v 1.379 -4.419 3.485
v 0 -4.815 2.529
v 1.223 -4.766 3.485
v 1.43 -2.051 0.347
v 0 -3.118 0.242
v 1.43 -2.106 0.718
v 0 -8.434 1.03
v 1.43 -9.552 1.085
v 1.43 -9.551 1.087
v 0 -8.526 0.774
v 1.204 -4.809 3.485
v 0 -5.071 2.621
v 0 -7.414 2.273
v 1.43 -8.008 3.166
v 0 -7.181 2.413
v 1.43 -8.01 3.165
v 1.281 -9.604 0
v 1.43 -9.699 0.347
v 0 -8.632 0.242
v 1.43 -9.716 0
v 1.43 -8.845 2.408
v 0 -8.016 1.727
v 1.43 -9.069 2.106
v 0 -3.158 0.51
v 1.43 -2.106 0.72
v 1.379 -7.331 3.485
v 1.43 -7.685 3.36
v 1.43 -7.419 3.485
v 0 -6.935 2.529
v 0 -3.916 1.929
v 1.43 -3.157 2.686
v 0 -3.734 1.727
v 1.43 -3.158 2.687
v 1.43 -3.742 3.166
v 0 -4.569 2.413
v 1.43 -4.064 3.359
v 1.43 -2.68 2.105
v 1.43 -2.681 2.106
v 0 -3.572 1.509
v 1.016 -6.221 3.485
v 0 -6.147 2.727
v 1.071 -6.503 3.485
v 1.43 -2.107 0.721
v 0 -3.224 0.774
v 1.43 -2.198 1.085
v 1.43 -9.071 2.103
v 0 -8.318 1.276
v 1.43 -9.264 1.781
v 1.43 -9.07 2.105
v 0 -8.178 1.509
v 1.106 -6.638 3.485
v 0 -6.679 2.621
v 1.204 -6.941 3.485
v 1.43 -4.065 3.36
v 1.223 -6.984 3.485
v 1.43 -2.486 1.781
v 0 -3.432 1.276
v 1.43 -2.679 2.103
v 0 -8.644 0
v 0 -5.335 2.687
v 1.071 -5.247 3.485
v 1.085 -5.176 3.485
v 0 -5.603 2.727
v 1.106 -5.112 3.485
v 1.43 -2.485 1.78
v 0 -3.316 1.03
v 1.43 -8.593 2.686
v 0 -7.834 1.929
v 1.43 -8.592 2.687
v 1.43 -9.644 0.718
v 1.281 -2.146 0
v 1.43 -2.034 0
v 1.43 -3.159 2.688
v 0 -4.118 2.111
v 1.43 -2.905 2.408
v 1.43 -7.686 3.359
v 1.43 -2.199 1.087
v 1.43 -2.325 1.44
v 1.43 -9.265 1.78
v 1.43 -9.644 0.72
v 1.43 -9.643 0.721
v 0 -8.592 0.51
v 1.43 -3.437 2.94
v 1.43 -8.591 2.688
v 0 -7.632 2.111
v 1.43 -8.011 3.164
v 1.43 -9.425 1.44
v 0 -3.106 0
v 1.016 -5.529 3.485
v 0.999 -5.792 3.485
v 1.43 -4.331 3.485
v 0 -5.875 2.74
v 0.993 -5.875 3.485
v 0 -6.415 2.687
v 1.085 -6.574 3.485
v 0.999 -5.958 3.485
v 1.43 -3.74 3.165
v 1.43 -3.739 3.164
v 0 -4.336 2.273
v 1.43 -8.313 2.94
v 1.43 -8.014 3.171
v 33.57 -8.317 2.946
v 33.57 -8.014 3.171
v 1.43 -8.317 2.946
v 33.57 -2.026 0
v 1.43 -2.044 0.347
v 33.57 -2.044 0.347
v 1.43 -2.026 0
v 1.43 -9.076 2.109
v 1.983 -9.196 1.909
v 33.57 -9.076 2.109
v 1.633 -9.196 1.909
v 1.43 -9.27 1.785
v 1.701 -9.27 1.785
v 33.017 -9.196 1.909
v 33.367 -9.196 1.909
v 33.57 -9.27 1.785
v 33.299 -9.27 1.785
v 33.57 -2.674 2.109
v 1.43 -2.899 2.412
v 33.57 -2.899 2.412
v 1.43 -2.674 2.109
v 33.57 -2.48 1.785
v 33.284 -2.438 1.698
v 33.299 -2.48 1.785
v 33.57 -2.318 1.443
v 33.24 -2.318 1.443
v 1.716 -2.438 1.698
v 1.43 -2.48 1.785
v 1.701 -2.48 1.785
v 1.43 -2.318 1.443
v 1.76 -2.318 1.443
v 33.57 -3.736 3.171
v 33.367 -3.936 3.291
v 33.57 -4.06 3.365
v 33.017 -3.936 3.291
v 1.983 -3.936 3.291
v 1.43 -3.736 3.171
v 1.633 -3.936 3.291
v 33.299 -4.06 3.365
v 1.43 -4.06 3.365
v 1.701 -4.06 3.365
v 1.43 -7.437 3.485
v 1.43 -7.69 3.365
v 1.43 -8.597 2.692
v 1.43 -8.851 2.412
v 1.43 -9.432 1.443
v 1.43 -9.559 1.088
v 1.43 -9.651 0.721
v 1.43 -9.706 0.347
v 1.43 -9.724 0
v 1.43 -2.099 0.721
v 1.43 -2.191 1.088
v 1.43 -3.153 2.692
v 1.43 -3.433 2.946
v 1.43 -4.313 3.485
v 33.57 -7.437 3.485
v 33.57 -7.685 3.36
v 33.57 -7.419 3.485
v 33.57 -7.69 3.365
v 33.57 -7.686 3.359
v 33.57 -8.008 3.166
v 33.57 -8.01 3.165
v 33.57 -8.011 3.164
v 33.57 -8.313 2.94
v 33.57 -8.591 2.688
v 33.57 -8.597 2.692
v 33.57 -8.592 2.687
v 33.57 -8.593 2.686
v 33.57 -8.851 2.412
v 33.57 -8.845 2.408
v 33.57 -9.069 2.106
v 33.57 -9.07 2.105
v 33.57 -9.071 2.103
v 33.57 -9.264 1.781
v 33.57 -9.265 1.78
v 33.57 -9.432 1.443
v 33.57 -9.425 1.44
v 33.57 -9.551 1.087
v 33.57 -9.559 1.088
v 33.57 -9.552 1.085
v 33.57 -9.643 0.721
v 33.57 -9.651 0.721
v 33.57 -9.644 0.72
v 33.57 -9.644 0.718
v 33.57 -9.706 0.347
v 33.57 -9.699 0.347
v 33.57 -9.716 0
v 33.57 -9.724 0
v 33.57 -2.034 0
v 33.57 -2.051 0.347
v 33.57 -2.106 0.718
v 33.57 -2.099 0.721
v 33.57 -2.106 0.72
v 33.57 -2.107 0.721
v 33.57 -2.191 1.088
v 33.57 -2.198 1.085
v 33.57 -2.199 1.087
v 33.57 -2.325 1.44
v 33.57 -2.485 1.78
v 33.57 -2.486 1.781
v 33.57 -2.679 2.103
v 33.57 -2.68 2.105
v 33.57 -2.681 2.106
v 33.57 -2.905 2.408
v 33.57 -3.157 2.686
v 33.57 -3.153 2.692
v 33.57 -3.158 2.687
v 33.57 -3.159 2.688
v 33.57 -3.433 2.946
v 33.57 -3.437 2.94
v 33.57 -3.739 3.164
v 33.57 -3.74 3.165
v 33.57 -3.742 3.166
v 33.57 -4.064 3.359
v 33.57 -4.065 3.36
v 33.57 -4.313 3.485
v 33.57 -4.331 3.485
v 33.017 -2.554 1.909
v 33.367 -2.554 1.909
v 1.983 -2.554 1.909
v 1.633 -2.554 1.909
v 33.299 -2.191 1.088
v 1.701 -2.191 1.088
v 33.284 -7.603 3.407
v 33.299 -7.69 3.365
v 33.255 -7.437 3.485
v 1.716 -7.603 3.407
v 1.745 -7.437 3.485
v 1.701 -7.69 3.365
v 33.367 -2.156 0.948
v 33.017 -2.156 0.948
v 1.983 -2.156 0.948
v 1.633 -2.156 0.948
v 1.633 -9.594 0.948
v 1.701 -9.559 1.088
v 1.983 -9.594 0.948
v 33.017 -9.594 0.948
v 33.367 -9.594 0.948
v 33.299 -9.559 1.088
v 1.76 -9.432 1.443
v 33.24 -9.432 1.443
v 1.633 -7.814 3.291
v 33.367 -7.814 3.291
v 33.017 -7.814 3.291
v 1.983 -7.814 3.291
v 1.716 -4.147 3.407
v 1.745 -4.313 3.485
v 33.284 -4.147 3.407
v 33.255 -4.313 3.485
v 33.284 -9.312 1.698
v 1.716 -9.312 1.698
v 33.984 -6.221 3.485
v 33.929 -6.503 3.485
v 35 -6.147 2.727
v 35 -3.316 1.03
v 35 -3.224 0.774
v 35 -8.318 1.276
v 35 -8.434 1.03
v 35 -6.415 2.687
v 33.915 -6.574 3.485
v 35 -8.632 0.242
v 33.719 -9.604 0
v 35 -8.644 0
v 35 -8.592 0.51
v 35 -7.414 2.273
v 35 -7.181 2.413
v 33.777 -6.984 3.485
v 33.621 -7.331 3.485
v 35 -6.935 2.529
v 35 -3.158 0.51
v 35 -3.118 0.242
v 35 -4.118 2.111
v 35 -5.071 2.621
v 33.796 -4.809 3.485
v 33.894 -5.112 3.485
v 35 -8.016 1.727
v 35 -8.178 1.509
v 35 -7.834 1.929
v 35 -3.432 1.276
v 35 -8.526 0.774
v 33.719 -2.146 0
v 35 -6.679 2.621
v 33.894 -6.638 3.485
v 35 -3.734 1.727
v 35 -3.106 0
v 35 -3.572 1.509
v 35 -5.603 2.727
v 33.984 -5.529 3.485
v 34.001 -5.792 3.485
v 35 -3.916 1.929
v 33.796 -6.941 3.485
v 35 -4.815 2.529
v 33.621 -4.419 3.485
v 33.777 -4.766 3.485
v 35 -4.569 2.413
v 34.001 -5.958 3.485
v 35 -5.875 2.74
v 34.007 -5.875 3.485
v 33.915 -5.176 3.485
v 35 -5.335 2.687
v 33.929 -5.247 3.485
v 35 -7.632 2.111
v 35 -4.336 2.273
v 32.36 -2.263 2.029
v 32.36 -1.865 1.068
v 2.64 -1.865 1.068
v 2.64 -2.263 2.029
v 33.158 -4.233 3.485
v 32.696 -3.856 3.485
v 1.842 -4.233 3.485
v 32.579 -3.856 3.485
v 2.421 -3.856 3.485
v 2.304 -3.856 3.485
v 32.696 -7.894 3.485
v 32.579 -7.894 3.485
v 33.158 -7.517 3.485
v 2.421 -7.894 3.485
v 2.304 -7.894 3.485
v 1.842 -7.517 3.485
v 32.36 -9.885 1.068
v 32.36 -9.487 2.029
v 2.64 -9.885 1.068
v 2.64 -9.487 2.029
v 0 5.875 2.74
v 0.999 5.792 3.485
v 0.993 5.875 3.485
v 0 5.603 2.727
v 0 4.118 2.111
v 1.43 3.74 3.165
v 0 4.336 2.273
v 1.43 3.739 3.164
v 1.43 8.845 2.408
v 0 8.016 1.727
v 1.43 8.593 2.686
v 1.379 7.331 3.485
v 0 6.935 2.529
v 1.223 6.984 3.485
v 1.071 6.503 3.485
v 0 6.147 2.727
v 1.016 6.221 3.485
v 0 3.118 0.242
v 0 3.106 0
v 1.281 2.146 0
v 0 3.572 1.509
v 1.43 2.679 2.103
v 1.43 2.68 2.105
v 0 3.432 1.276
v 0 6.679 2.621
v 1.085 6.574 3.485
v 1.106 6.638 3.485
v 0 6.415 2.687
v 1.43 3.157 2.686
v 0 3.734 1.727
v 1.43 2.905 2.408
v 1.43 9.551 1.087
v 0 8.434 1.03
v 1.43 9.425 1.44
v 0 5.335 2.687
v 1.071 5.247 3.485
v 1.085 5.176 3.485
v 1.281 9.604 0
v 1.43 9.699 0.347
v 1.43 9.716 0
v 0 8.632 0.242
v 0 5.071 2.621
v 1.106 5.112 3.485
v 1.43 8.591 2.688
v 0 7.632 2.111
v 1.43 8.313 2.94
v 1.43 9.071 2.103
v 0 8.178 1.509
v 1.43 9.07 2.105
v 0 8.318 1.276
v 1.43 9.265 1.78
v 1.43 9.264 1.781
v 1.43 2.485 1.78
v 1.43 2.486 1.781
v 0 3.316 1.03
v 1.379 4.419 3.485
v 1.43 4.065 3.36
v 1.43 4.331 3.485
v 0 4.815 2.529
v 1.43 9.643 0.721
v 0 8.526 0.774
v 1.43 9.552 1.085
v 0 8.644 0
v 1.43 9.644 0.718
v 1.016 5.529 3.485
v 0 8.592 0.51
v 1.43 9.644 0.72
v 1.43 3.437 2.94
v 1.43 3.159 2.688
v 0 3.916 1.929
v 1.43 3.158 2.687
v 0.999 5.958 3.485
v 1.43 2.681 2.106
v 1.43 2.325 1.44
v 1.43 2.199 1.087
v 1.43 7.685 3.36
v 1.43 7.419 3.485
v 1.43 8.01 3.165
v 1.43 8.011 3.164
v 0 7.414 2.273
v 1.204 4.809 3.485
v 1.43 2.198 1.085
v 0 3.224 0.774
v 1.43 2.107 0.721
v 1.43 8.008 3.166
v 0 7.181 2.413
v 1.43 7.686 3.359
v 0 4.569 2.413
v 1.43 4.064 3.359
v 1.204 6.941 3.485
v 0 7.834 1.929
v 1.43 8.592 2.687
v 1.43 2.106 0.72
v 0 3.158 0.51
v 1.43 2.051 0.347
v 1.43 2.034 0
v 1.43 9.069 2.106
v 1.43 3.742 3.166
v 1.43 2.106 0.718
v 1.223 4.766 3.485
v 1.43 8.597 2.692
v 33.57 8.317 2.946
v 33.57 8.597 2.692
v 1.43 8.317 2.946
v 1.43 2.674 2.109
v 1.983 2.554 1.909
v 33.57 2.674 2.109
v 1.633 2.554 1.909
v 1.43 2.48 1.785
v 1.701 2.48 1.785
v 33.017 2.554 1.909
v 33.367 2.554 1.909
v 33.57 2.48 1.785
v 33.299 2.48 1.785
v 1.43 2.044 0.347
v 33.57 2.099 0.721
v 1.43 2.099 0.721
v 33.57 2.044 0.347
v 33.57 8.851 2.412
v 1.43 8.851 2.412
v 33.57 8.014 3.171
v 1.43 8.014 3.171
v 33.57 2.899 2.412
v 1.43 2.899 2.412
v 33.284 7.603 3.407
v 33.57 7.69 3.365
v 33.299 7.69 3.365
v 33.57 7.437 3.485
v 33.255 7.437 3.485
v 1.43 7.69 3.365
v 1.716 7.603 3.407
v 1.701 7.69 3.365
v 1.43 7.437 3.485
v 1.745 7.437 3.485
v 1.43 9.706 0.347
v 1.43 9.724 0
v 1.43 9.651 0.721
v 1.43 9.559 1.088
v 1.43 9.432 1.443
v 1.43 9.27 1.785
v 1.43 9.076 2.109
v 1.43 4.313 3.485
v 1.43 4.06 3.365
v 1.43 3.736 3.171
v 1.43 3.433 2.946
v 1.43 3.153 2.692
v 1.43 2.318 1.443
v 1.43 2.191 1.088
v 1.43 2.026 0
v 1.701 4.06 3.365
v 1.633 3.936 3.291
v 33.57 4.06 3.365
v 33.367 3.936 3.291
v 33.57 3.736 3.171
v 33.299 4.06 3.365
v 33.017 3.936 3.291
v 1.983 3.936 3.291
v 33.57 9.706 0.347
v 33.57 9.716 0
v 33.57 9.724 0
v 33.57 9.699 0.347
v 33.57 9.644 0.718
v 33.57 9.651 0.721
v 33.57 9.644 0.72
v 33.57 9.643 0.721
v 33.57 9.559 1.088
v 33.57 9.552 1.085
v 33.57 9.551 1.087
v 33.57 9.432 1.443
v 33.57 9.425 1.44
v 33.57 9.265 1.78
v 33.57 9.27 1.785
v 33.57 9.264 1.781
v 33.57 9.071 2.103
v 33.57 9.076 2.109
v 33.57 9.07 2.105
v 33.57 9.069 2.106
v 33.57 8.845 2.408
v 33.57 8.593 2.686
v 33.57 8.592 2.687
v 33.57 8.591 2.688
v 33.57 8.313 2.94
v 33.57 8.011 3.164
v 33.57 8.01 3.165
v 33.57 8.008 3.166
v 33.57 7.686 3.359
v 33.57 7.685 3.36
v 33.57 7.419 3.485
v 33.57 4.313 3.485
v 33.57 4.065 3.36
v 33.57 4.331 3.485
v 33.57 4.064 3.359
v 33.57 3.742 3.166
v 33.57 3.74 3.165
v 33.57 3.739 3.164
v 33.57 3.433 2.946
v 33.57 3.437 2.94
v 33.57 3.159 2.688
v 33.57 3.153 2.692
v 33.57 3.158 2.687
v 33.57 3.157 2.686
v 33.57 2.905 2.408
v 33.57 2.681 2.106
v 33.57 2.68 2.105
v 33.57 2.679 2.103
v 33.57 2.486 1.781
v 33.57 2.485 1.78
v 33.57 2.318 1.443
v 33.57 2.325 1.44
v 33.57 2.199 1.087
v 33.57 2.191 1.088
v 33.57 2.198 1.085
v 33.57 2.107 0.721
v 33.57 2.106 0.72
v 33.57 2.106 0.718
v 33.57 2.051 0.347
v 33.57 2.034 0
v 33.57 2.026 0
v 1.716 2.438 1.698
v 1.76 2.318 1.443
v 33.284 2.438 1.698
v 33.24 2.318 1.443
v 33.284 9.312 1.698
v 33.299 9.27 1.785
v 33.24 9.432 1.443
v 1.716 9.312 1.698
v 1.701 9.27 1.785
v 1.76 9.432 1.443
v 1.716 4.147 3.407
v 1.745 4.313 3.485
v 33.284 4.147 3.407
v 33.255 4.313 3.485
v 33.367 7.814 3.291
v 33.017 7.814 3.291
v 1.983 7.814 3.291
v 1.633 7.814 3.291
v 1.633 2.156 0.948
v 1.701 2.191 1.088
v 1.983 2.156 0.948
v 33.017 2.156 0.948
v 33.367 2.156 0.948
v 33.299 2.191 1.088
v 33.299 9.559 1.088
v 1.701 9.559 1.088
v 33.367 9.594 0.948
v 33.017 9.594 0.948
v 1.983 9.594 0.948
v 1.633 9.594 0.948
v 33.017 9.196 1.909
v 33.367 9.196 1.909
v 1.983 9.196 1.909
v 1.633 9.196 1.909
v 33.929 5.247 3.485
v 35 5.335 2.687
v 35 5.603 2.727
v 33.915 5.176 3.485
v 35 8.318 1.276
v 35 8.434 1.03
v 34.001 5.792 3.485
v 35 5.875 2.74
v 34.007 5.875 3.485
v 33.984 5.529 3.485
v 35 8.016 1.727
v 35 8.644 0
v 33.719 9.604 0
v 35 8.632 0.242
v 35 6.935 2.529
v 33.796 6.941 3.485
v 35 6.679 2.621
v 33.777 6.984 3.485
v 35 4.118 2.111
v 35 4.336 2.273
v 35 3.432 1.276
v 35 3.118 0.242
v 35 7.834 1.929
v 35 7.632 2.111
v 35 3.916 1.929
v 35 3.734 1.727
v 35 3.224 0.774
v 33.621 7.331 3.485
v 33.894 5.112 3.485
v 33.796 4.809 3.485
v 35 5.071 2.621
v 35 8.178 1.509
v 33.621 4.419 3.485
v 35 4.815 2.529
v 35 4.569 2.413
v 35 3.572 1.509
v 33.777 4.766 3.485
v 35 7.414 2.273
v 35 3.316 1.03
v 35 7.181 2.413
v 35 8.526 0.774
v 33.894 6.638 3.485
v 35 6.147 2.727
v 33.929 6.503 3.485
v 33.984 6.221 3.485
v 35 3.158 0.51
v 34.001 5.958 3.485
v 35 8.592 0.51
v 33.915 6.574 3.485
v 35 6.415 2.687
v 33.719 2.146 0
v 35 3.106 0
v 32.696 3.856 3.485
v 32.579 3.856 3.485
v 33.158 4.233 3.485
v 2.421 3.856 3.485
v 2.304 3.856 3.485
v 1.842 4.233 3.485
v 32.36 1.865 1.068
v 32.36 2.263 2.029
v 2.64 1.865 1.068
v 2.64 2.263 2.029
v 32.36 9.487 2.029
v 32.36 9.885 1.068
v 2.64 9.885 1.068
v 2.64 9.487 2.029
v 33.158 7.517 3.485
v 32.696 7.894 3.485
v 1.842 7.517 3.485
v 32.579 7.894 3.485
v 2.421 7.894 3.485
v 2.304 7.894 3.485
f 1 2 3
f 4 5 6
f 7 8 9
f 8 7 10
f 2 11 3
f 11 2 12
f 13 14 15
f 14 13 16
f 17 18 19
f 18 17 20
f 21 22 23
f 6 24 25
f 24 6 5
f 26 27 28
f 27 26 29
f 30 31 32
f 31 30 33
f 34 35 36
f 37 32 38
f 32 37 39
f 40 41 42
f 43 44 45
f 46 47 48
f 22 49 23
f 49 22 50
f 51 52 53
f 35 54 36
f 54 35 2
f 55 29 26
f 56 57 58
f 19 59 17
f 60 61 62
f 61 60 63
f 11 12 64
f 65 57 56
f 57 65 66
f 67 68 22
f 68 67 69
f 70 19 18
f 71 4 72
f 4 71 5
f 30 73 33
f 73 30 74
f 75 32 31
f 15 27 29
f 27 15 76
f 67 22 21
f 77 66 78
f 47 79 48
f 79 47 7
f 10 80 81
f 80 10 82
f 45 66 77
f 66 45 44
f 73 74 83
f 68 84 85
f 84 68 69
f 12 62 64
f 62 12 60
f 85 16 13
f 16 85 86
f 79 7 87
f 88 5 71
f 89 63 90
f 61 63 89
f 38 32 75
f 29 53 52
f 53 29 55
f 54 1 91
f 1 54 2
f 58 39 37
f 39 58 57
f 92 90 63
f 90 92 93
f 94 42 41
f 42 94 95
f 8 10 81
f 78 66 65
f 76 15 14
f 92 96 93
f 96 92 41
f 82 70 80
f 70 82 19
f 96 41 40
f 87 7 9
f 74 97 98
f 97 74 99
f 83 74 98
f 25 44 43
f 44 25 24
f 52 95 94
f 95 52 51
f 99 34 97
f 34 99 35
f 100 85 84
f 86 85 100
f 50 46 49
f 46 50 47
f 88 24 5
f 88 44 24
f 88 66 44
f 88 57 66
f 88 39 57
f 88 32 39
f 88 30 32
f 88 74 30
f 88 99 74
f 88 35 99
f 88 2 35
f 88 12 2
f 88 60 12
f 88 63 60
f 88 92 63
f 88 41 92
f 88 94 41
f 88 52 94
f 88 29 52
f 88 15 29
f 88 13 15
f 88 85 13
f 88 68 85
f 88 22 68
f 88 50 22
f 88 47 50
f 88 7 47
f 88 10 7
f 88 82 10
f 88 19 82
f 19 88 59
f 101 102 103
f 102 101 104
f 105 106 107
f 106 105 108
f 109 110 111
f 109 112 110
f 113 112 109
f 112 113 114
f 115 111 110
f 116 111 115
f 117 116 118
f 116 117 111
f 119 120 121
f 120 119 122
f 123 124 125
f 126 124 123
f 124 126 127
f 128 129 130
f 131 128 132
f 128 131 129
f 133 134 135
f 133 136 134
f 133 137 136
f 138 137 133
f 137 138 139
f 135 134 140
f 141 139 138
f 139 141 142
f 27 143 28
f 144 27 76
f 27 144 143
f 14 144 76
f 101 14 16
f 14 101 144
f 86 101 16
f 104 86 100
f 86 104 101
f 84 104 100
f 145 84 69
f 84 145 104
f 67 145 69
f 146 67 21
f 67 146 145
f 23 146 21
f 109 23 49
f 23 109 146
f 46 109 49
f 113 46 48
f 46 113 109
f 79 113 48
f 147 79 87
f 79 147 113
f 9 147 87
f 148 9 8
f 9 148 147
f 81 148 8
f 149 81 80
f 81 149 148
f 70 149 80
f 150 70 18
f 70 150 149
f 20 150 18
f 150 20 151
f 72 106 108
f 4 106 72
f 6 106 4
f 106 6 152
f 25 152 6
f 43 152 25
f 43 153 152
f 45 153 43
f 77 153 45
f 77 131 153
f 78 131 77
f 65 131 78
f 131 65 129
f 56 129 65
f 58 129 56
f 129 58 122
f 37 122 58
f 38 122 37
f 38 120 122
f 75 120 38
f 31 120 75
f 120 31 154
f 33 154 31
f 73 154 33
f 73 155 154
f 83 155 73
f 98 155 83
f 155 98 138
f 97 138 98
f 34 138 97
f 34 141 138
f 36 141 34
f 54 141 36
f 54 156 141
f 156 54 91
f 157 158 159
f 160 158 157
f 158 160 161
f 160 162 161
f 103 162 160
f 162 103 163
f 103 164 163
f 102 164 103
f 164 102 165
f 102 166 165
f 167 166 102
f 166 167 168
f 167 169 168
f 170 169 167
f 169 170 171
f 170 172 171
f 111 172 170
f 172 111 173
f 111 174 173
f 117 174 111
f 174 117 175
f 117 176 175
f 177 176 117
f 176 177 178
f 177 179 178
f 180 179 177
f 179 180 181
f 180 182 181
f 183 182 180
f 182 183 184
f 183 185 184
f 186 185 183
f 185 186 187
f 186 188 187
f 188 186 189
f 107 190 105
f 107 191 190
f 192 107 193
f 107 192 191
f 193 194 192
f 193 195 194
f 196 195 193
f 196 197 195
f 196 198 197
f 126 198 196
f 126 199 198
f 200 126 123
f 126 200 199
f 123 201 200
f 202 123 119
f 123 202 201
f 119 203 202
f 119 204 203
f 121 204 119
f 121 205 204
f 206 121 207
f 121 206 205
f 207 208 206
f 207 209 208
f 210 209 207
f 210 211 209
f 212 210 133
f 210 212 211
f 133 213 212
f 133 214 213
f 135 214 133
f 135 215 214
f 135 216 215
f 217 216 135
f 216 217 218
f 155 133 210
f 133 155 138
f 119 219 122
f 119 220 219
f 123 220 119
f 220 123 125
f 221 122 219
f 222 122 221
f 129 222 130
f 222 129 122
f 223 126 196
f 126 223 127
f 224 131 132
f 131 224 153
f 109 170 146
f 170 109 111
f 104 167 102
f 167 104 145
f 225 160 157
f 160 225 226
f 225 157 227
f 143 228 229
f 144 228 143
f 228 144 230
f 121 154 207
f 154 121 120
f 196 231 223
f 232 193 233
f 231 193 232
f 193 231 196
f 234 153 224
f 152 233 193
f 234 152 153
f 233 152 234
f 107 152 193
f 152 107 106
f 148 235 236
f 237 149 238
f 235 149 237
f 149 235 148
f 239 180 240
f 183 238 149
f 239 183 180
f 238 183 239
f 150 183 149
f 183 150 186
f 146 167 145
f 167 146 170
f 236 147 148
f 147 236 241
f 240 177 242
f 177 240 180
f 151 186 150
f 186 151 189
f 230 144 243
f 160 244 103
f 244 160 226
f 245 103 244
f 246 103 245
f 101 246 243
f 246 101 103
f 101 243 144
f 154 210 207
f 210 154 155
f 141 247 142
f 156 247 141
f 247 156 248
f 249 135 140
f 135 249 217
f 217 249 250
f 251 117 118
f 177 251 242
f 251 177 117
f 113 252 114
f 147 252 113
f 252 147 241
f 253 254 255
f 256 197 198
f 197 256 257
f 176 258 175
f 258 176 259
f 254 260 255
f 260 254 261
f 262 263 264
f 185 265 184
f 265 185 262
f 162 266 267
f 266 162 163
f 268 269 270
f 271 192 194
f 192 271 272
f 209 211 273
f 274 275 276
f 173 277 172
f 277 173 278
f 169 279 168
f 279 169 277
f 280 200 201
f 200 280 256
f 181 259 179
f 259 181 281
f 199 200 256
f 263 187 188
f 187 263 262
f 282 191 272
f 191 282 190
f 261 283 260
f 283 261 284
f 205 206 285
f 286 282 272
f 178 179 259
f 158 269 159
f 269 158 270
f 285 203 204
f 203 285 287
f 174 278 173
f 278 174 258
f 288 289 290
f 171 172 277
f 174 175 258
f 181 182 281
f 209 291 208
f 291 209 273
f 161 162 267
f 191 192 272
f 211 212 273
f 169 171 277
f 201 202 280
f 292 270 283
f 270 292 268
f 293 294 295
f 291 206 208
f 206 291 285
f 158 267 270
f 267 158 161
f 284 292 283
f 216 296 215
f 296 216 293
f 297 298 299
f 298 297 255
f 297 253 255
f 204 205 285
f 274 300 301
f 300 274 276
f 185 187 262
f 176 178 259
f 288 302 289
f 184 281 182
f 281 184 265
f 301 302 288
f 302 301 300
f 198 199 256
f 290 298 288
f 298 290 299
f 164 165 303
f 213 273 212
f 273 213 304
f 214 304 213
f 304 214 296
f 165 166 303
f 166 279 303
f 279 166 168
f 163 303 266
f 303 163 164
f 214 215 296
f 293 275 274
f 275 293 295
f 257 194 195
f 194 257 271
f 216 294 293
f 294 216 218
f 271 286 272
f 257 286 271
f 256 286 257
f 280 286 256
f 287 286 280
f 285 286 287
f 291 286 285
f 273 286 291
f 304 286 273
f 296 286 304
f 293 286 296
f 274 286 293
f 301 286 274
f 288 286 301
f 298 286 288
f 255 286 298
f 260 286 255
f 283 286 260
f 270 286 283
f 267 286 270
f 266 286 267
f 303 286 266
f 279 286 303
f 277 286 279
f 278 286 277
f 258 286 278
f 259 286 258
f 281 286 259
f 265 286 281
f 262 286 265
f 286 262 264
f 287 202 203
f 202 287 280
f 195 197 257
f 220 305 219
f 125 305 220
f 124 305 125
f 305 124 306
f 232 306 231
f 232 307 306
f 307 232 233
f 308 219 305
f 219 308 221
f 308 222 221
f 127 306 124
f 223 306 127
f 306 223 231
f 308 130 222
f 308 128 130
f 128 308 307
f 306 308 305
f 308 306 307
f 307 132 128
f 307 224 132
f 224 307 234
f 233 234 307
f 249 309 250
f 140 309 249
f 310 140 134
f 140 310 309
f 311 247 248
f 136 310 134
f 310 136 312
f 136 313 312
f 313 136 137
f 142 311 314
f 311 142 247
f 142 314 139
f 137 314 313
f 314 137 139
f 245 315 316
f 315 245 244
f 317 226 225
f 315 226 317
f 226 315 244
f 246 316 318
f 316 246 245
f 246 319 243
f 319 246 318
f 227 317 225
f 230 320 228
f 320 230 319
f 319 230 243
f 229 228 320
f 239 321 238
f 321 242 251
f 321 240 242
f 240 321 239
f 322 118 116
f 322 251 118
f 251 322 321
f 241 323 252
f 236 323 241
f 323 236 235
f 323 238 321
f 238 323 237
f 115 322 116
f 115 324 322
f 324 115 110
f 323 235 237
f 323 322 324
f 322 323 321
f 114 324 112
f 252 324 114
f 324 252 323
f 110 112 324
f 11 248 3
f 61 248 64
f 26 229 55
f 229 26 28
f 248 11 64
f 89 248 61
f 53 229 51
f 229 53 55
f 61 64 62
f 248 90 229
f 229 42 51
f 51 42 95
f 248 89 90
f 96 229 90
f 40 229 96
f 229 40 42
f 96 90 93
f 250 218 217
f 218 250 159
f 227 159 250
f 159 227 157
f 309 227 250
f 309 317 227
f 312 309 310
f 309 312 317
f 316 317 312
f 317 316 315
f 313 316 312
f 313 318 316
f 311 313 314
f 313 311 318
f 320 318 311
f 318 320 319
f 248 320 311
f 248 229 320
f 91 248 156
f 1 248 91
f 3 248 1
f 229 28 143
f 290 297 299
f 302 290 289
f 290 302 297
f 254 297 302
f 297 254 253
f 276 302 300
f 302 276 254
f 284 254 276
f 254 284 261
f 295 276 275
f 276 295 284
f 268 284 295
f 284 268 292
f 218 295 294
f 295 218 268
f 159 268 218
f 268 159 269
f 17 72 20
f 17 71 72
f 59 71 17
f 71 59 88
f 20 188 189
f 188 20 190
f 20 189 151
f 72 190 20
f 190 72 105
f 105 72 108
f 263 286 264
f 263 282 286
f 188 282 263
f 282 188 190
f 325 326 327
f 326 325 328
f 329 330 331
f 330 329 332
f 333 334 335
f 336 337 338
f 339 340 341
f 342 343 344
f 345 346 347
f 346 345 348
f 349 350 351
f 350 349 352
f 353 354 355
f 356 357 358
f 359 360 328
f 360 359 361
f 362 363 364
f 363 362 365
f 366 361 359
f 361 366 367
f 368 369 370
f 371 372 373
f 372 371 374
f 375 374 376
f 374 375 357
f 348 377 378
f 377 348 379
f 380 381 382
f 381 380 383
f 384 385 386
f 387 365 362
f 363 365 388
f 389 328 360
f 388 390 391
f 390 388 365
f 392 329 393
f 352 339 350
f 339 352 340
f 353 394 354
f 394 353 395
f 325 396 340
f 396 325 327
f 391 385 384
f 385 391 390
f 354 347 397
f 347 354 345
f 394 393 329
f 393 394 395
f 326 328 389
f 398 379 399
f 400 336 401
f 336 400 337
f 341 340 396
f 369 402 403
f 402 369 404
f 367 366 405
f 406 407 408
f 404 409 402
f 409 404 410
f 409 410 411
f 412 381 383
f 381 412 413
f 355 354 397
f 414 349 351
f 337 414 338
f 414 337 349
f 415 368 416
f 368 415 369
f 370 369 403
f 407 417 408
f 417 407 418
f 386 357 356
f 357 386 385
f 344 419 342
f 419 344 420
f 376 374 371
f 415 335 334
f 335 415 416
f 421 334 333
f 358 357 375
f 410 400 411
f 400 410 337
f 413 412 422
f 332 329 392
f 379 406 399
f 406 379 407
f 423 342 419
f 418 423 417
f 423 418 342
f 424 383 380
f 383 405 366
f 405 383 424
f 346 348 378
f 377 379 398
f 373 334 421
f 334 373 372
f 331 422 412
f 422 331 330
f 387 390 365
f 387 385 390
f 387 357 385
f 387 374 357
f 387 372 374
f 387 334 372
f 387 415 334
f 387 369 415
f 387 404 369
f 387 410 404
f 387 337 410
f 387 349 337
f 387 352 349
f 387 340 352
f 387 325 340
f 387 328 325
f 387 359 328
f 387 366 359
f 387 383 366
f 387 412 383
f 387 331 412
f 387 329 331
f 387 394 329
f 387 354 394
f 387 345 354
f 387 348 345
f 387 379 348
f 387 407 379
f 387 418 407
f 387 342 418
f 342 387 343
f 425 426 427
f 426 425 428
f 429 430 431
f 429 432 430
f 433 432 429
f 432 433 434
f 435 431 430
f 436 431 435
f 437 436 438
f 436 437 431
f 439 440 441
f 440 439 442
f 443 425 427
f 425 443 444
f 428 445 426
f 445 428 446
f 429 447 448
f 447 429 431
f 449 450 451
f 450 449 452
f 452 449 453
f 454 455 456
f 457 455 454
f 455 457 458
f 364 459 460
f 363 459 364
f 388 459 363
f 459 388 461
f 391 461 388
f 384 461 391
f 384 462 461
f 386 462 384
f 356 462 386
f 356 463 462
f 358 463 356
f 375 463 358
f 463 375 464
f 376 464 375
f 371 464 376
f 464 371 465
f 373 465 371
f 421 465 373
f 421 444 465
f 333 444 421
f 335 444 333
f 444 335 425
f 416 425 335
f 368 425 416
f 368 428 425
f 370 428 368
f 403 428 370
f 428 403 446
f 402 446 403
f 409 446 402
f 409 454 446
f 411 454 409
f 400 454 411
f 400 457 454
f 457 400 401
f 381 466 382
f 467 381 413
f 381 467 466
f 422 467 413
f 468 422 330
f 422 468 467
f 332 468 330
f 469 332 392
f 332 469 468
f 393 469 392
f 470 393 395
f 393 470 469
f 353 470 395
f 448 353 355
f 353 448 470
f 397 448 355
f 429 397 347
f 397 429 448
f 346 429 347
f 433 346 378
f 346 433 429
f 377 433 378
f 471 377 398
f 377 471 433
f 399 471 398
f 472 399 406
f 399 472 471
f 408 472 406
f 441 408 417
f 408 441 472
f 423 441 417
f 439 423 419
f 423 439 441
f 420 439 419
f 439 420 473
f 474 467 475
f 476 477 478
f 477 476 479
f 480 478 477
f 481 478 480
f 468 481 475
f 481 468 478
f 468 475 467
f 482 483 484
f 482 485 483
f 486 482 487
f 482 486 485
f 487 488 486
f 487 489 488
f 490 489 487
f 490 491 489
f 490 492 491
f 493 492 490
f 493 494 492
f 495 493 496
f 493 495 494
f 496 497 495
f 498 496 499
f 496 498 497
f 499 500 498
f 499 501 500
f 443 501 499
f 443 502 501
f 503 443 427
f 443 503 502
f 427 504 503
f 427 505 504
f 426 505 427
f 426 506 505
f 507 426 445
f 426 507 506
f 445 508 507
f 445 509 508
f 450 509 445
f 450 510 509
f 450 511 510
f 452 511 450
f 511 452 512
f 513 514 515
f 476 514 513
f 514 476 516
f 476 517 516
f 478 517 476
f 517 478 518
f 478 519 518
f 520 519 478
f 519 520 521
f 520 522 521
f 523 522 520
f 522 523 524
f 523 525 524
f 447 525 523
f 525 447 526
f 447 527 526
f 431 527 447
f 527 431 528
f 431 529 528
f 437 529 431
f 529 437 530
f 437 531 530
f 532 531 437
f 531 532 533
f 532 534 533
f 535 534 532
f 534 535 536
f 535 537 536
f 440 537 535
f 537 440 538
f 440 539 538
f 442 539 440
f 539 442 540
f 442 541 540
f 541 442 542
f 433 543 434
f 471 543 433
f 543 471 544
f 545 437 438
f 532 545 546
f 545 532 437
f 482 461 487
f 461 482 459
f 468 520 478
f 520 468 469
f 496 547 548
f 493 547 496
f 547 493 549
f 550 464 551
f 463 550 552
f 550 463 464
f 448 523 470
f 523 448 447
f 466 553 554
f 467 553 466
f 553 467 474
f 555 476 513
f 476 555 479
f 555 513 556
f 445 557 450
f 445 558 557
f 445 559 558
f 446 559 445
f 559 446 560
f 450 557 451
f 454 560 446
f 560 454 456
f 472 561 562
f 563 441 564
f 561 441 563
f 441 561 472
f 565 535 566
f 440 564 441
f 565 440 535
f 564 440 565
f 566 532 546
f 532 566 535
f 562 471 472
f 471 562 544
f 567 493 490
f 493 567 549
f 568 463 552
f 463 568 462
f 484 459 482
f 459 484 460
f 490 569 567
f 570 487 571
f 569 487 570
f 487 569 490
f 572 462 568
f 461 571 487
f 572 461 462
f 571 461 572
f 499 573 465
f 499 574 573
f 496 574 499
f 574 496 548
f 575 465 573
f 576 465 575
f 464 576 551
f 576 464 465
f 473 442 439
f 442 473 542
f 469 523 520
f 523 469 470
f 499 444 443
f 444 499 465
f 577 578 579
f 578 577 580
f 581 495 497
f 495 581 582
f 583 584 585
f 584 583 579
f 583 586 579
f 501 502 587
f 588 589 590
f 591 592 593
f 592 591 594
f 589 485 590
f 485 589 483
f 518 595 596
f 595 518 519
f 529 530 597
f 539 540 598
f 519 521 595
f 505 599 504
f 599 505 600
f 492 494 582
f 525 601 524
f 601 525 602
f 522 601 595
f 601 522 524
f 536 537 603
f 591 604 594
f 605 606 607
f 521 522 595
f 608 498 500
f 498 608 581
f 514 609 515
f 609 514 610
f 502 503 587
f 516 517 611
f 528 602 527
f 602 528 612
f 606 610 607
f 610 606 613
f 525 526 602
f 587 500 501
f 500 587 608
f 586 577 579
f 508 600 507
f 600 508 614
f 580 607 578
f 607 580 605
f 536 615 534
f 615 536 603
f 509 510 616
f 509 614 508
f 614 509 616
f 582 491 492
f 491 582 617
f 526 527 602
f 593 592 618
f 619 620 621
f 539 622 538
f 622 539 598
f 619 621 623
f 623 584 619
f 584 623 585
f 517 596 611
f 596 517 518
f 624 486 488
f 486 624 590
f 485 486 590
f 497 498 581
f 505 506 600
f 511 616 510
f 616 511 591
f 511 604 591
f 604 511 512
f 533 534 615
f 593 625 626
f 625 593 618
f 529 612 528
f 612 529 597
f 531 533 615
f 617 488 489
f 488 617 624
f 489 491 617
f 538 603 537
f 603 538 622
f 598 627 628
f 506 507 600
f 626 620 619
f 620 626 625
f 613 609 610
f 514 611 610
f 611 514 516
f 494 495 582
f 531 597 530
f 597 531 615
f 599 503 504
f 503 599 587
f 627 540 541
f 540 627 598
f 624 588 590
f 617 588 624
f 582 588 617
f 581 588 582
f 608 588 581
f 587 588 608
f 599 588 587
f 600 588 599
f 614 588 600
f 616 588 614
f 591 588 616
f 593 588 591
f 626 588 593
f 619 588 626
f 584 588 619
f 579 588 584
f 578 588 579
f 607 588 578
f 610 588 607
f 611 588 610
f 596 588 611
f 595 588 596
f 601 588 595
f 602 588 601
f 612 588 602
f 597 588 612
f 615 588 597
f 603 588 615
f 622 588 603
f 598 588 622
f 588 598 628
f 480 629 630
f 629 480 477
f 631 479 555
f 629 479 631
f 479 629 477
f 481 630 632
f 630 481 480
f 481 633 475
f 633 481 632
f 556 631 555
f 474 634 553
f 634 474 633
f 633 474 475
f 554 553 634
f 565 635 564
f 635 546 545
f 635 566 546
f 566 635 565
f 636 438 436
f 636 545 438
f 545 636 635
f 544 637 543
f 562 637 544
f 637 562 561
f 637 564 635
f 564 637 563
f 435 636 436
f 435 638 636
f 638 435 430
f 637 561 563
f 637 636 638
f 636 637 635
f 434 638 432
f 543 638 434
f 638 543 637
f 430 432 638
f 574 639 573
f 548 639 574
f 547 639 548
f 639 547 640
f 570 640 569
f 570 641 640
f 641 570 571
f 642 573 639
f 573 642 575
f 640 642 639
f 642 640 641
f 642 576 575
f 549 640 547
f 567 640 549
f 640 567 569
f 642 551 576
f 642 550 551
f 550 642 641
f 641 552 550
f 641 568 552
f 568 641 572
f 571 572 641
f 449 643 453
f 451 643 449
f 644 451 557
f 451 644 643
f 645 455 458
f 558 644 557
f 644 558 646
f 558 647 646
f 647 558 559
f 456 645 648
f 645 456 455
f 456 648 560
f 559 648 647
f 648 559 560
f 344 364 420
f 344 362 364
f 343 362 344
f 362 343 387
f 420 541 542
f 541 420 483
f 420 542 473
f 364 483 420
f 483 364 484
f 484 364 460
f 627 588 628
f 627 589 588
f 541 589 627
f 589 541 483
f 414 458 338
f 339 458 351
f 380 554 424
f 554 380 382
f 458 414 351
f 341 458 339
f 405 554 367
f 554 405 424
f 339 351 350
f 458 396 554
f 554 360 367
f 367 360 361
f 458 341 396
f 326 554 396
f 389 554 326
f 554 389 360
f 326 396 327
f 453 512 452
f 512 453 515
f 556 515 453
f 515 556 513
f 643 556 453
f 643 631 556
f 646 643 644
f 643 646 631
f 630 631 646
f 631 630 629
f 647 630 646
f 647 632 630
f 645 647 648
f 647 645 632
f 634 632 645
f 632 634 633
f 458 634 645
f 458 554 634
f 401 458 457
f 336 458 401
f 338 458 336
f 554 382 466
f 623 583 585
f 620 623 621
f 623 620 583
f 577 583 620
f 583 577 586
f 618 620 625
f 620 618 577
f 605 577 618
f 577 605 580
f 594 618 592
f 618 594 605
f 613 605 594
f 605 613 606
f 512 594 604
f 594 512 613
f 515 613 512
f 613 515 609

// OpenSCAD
// =====================================================================
//  20_DOWELS.SCAD — Parametric Split-Half Flat-Printed Dowel Generator
//  Prints flat on the build plate for maximum XY shear/bending strength!
// =====================================================================

/* [1. Dowel Style & Surface Grip] */
// Print Orientation & Split Style [split_loose:Split Halves (Two Separate Flat-Printed Pieces — Default), solid_flat:One-Piece Flat-Sided (Flattened Top & Bottom)]
dowel_style = "split_loose";

// Shaft Grip / Surface Profile [crush_ribs:Longitudinal Crush Ribs (Tightens Joint!), fluted:Fluted Glue Grooves (Classic Wood Dowel), smooth:Smooth Cylindrical Shaft]
surface_style = "crush_ribs";

// Measurement System [metric:Metric (mm), imperial:Imperial / SAE (Inches)]
unit_system = "metric";

/* [2. Diameter & Length] */
// Metric Dowel Diameter (mm) [4:4 mm, 5:5 mm, 6:6 mm (Standard Small), 8:8 mm (Standard Furniture), 10:10 mm (Heavy), 12:12 mm, 16:16 mm] @show_if(unit_system=metric)
metric_dia = 8;

// Imperial Dowel Diameter [4.7625:3/16" (4.76 mm), 6.35:1/4" (6.35 mm), 7.9375:5/16" (7.94 mm), 9.525:3/8" (9.53 mm), 12.7:1/2" (12.70 mm), 15.875:5/8" (15.88 mm)] @show_if(unit_system=imperial)
imperial_dia = 6.35;

// Custom Diameter Override in mm (0 = Use Preset Above)
custom_dia = 0;

// Total Dowel Length (mm) [15:15 mm, 20:20 mm, 25:25 mm (~1"), 30:30 mm (Standard), 35:35 mm, 40:40 mm (~1.5"), 50:50 mm (~2"), 60:60 mm, 75:75 mm (~3"), 100:100 mm (~4")]
dowel_length = 35;

// Beveled 45° Insertion Tips on Both Ends
bevel_tips = true;

/* [3. Rib / Groove & Fit Tuning] */
// Crush Rib Count Around Circumference [6:6 Ribs, 8:8 Ribs (Default), 10:10 Ribs, 12:12 Ribs] @show_if(surface_style=crush_ribs|fluted)
rib_count = 8;

// Crush Rib Interference (How Far Ribs Stand Proud of Hole Diameter, mm) [0.15:0.15 mm (Light Snug), 0.25:0.25 mm (Standard Press-Fit), 0.35:0.35 mm (Firm Hammer-In), 0.45:0.45 mm (Extra Tight)] @show_if(surface_style=crush_ribs)
rib_interference = 0.25;

// Base Shaft Clearance (Shrinks Core Below Hole Diameter for Easy Start, mm) [0.05:0.05 mm (Tight), 0.15:0.15 mm (Standard), 0.25:0.25 mm (Loose)]
fit_clearance = 0.15;

/* [4. Split-Half & Batch Layout] */
// Flatten Top of Split Halves (% of Diameter — Removes Top-Layer Blobs) [0:0% (Full Round), 8:8% (Recommended), 12:12%] @show_if(dowel_style=split_loose)
split_top_cut = 8;

// Quantity of Dowels to Print on Plate [1:1 Dowel, 2:2 Dowels, 4:4 Dowels, 6:6 Dowels, 8:8 Dowels, 12:12 Dowels]
quantity = 1;

/* [Hidden] */
$fn = 64;
eps = 0.01;

D_nom = (custom_dia > 0) ? custom_dia : ((unit_system == "metric") ? metric_dia : imperial_dia);
L     = max(10, dowel_length);
D_core = max(2.0, D_nom - fit_clearance * 2);
R_core = D_core / 2;
bevel_h = bevel_tips ? min(2.2, max(0.8, D_nom * 0.18)) : 0;

rib_w     = max(0.7, min(1.4, D_nom * 0.13));
rib_r_out = (D_nom + rib_interference) / 2;
flute_r   = max(0.4, min(1.0, D_nom * 0.08));

echo(str("[SPEC] Dowel: Ø", round(D_nom * 100) / 100, " mm × ", L, " mm | Style: ", dowel_style, " | Surface: ", surface_style, " | Qty: ", quantity));

module dowel_3d_along_x() {
    taper_end = max(bevel_h + 1.2, 2.5);

    rotate([0, 90, 0])
    difference() {
        union() {
            if (bevel_tips) {
                cylinder(r1 = R_core - bevel_h * 0.75, r2 = R_core, h = bevel_h);
                translate([0, 0, bevel_h - eps])
                    cylinder(r = R_core, h = L - 2 * bevel_h + 2 * eps);
                translate([0, 0, L - bevel_h])
                    cylinder(r1 = R_core, r2 = R_core - bevel_h * 0.75, h = bevel_h);
            } else {
                cylinder(r = R_core, h = L);
            }

            if (surface_style == "crush_ribs") {
                for (i = [0 : rib_count - 1]) {
                    ang = (i + 0.5) * (360 / rib_count);
                    rotate([0, 0, ang])
                    rotate([90, 0, 0])
                    linear_extrude(height = rib_w, center = true)
                        polygon([
                            [R_core - 0.3, bevel_h],
                            [R_core - 0.1, bevel_h],
                            [rib_r_out,    taper_end],
                            [rib_r_out,    L - taper_end],
                            [R_core - 0.1, L - bevel_h],
                            [R_core - 0.3, L - bevel_h]
                        ]);
                }
            }
        }

        if (surface_style == "fluted") {
            for (i = [0 : rib_count - 1]) {
                ang = (i + 0.5) * (360 / rib_count);
                rotate([0, 0, ang])
                translate([R_core, 0, bevel_h * 0.5])
                    cylinder(r = flute_r, h = L - bevel_h, $fn = 16);
            }
        }
    }
}

module single_dowel_printable() {
    max_r   = (surface_style == "crush_ribs") ? rib_r_out : R_core;
    skim    = 0.03;
    half_h  = max_r - (D_nom * split_top_cut / 100);
    h_gap   = 3.5;
    split_y = max_r + h_gap / 2;
    big     = max(L, D_nom) * 2 + 10;

    if (dowel_style == "solid_flat") {
        flat_t = D_nom * 0.76;
        translate([0, 0, flat_t / 2])
        intersection() {
            dowel_3d_along_x();
            translate([-1, -big / 2, -flat_t / 2])
                cube([L + 2, big, flat_t]);
        }
    } else {
        // Upper Half (Z >= skim)
        translate([0, -split_y, -skim])
        intersection() {
            dowel_3d_along_x();
            translate([-1, -big / 2, skim])
                cube([L + 2, big, half_h]);
        }

        // Lower Half (Z <= -skim flipped 180° around X)
        translate([0, split_y, -skim])
        rotate([180, 0, 0])
        intersection() {
            dowel_3d_along_x();
            translate([-1, -big / 2, -half_h - skim])
                cube([L + 2, big, half_h]);
        }
    }
}

max_d = (surface_style == "crush_ribs") ? (rib_r_out * 2) : D_nom;
cell_w = L + 8;
cell_d = (dowel_style == "solid_flat") ? (max_d + 6) : (max_d * 2 + 9);
cols = max(1, ceil(sqrt(quantity * cell_d / cell_w)));

for (i = [0 : quantity - 1]) {
    cx = (i % cols) * cell_w;
    cy = floor(i / cols) * cell_d;
    translate([cx, cy, 0])
        single_dowel_printable();
}
